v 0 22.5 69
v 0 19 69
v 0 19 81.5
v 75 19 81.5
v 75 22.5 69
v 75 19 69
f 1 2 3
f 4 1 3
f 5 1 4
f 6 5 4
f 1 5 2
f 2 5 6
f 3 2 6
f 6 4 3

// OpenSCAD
include <./MCAD/3d_triangle.scad>
height = 75;
//width = 24.5;
width = 19;
depth = 81.5;
cylinder_diam = 24.5;
side_depth = 12.50;
side_width = 21.5;
side_width_end = 18;
shelldepth = 2;
shellwidth = 2;

translate (v = [0,width ,depth])rotate(a=90, v=[0,90,0])3dtri_draw([0,0,0],[side_depth,0,0],[side_depth,side_width-side_width_end,0],height);
